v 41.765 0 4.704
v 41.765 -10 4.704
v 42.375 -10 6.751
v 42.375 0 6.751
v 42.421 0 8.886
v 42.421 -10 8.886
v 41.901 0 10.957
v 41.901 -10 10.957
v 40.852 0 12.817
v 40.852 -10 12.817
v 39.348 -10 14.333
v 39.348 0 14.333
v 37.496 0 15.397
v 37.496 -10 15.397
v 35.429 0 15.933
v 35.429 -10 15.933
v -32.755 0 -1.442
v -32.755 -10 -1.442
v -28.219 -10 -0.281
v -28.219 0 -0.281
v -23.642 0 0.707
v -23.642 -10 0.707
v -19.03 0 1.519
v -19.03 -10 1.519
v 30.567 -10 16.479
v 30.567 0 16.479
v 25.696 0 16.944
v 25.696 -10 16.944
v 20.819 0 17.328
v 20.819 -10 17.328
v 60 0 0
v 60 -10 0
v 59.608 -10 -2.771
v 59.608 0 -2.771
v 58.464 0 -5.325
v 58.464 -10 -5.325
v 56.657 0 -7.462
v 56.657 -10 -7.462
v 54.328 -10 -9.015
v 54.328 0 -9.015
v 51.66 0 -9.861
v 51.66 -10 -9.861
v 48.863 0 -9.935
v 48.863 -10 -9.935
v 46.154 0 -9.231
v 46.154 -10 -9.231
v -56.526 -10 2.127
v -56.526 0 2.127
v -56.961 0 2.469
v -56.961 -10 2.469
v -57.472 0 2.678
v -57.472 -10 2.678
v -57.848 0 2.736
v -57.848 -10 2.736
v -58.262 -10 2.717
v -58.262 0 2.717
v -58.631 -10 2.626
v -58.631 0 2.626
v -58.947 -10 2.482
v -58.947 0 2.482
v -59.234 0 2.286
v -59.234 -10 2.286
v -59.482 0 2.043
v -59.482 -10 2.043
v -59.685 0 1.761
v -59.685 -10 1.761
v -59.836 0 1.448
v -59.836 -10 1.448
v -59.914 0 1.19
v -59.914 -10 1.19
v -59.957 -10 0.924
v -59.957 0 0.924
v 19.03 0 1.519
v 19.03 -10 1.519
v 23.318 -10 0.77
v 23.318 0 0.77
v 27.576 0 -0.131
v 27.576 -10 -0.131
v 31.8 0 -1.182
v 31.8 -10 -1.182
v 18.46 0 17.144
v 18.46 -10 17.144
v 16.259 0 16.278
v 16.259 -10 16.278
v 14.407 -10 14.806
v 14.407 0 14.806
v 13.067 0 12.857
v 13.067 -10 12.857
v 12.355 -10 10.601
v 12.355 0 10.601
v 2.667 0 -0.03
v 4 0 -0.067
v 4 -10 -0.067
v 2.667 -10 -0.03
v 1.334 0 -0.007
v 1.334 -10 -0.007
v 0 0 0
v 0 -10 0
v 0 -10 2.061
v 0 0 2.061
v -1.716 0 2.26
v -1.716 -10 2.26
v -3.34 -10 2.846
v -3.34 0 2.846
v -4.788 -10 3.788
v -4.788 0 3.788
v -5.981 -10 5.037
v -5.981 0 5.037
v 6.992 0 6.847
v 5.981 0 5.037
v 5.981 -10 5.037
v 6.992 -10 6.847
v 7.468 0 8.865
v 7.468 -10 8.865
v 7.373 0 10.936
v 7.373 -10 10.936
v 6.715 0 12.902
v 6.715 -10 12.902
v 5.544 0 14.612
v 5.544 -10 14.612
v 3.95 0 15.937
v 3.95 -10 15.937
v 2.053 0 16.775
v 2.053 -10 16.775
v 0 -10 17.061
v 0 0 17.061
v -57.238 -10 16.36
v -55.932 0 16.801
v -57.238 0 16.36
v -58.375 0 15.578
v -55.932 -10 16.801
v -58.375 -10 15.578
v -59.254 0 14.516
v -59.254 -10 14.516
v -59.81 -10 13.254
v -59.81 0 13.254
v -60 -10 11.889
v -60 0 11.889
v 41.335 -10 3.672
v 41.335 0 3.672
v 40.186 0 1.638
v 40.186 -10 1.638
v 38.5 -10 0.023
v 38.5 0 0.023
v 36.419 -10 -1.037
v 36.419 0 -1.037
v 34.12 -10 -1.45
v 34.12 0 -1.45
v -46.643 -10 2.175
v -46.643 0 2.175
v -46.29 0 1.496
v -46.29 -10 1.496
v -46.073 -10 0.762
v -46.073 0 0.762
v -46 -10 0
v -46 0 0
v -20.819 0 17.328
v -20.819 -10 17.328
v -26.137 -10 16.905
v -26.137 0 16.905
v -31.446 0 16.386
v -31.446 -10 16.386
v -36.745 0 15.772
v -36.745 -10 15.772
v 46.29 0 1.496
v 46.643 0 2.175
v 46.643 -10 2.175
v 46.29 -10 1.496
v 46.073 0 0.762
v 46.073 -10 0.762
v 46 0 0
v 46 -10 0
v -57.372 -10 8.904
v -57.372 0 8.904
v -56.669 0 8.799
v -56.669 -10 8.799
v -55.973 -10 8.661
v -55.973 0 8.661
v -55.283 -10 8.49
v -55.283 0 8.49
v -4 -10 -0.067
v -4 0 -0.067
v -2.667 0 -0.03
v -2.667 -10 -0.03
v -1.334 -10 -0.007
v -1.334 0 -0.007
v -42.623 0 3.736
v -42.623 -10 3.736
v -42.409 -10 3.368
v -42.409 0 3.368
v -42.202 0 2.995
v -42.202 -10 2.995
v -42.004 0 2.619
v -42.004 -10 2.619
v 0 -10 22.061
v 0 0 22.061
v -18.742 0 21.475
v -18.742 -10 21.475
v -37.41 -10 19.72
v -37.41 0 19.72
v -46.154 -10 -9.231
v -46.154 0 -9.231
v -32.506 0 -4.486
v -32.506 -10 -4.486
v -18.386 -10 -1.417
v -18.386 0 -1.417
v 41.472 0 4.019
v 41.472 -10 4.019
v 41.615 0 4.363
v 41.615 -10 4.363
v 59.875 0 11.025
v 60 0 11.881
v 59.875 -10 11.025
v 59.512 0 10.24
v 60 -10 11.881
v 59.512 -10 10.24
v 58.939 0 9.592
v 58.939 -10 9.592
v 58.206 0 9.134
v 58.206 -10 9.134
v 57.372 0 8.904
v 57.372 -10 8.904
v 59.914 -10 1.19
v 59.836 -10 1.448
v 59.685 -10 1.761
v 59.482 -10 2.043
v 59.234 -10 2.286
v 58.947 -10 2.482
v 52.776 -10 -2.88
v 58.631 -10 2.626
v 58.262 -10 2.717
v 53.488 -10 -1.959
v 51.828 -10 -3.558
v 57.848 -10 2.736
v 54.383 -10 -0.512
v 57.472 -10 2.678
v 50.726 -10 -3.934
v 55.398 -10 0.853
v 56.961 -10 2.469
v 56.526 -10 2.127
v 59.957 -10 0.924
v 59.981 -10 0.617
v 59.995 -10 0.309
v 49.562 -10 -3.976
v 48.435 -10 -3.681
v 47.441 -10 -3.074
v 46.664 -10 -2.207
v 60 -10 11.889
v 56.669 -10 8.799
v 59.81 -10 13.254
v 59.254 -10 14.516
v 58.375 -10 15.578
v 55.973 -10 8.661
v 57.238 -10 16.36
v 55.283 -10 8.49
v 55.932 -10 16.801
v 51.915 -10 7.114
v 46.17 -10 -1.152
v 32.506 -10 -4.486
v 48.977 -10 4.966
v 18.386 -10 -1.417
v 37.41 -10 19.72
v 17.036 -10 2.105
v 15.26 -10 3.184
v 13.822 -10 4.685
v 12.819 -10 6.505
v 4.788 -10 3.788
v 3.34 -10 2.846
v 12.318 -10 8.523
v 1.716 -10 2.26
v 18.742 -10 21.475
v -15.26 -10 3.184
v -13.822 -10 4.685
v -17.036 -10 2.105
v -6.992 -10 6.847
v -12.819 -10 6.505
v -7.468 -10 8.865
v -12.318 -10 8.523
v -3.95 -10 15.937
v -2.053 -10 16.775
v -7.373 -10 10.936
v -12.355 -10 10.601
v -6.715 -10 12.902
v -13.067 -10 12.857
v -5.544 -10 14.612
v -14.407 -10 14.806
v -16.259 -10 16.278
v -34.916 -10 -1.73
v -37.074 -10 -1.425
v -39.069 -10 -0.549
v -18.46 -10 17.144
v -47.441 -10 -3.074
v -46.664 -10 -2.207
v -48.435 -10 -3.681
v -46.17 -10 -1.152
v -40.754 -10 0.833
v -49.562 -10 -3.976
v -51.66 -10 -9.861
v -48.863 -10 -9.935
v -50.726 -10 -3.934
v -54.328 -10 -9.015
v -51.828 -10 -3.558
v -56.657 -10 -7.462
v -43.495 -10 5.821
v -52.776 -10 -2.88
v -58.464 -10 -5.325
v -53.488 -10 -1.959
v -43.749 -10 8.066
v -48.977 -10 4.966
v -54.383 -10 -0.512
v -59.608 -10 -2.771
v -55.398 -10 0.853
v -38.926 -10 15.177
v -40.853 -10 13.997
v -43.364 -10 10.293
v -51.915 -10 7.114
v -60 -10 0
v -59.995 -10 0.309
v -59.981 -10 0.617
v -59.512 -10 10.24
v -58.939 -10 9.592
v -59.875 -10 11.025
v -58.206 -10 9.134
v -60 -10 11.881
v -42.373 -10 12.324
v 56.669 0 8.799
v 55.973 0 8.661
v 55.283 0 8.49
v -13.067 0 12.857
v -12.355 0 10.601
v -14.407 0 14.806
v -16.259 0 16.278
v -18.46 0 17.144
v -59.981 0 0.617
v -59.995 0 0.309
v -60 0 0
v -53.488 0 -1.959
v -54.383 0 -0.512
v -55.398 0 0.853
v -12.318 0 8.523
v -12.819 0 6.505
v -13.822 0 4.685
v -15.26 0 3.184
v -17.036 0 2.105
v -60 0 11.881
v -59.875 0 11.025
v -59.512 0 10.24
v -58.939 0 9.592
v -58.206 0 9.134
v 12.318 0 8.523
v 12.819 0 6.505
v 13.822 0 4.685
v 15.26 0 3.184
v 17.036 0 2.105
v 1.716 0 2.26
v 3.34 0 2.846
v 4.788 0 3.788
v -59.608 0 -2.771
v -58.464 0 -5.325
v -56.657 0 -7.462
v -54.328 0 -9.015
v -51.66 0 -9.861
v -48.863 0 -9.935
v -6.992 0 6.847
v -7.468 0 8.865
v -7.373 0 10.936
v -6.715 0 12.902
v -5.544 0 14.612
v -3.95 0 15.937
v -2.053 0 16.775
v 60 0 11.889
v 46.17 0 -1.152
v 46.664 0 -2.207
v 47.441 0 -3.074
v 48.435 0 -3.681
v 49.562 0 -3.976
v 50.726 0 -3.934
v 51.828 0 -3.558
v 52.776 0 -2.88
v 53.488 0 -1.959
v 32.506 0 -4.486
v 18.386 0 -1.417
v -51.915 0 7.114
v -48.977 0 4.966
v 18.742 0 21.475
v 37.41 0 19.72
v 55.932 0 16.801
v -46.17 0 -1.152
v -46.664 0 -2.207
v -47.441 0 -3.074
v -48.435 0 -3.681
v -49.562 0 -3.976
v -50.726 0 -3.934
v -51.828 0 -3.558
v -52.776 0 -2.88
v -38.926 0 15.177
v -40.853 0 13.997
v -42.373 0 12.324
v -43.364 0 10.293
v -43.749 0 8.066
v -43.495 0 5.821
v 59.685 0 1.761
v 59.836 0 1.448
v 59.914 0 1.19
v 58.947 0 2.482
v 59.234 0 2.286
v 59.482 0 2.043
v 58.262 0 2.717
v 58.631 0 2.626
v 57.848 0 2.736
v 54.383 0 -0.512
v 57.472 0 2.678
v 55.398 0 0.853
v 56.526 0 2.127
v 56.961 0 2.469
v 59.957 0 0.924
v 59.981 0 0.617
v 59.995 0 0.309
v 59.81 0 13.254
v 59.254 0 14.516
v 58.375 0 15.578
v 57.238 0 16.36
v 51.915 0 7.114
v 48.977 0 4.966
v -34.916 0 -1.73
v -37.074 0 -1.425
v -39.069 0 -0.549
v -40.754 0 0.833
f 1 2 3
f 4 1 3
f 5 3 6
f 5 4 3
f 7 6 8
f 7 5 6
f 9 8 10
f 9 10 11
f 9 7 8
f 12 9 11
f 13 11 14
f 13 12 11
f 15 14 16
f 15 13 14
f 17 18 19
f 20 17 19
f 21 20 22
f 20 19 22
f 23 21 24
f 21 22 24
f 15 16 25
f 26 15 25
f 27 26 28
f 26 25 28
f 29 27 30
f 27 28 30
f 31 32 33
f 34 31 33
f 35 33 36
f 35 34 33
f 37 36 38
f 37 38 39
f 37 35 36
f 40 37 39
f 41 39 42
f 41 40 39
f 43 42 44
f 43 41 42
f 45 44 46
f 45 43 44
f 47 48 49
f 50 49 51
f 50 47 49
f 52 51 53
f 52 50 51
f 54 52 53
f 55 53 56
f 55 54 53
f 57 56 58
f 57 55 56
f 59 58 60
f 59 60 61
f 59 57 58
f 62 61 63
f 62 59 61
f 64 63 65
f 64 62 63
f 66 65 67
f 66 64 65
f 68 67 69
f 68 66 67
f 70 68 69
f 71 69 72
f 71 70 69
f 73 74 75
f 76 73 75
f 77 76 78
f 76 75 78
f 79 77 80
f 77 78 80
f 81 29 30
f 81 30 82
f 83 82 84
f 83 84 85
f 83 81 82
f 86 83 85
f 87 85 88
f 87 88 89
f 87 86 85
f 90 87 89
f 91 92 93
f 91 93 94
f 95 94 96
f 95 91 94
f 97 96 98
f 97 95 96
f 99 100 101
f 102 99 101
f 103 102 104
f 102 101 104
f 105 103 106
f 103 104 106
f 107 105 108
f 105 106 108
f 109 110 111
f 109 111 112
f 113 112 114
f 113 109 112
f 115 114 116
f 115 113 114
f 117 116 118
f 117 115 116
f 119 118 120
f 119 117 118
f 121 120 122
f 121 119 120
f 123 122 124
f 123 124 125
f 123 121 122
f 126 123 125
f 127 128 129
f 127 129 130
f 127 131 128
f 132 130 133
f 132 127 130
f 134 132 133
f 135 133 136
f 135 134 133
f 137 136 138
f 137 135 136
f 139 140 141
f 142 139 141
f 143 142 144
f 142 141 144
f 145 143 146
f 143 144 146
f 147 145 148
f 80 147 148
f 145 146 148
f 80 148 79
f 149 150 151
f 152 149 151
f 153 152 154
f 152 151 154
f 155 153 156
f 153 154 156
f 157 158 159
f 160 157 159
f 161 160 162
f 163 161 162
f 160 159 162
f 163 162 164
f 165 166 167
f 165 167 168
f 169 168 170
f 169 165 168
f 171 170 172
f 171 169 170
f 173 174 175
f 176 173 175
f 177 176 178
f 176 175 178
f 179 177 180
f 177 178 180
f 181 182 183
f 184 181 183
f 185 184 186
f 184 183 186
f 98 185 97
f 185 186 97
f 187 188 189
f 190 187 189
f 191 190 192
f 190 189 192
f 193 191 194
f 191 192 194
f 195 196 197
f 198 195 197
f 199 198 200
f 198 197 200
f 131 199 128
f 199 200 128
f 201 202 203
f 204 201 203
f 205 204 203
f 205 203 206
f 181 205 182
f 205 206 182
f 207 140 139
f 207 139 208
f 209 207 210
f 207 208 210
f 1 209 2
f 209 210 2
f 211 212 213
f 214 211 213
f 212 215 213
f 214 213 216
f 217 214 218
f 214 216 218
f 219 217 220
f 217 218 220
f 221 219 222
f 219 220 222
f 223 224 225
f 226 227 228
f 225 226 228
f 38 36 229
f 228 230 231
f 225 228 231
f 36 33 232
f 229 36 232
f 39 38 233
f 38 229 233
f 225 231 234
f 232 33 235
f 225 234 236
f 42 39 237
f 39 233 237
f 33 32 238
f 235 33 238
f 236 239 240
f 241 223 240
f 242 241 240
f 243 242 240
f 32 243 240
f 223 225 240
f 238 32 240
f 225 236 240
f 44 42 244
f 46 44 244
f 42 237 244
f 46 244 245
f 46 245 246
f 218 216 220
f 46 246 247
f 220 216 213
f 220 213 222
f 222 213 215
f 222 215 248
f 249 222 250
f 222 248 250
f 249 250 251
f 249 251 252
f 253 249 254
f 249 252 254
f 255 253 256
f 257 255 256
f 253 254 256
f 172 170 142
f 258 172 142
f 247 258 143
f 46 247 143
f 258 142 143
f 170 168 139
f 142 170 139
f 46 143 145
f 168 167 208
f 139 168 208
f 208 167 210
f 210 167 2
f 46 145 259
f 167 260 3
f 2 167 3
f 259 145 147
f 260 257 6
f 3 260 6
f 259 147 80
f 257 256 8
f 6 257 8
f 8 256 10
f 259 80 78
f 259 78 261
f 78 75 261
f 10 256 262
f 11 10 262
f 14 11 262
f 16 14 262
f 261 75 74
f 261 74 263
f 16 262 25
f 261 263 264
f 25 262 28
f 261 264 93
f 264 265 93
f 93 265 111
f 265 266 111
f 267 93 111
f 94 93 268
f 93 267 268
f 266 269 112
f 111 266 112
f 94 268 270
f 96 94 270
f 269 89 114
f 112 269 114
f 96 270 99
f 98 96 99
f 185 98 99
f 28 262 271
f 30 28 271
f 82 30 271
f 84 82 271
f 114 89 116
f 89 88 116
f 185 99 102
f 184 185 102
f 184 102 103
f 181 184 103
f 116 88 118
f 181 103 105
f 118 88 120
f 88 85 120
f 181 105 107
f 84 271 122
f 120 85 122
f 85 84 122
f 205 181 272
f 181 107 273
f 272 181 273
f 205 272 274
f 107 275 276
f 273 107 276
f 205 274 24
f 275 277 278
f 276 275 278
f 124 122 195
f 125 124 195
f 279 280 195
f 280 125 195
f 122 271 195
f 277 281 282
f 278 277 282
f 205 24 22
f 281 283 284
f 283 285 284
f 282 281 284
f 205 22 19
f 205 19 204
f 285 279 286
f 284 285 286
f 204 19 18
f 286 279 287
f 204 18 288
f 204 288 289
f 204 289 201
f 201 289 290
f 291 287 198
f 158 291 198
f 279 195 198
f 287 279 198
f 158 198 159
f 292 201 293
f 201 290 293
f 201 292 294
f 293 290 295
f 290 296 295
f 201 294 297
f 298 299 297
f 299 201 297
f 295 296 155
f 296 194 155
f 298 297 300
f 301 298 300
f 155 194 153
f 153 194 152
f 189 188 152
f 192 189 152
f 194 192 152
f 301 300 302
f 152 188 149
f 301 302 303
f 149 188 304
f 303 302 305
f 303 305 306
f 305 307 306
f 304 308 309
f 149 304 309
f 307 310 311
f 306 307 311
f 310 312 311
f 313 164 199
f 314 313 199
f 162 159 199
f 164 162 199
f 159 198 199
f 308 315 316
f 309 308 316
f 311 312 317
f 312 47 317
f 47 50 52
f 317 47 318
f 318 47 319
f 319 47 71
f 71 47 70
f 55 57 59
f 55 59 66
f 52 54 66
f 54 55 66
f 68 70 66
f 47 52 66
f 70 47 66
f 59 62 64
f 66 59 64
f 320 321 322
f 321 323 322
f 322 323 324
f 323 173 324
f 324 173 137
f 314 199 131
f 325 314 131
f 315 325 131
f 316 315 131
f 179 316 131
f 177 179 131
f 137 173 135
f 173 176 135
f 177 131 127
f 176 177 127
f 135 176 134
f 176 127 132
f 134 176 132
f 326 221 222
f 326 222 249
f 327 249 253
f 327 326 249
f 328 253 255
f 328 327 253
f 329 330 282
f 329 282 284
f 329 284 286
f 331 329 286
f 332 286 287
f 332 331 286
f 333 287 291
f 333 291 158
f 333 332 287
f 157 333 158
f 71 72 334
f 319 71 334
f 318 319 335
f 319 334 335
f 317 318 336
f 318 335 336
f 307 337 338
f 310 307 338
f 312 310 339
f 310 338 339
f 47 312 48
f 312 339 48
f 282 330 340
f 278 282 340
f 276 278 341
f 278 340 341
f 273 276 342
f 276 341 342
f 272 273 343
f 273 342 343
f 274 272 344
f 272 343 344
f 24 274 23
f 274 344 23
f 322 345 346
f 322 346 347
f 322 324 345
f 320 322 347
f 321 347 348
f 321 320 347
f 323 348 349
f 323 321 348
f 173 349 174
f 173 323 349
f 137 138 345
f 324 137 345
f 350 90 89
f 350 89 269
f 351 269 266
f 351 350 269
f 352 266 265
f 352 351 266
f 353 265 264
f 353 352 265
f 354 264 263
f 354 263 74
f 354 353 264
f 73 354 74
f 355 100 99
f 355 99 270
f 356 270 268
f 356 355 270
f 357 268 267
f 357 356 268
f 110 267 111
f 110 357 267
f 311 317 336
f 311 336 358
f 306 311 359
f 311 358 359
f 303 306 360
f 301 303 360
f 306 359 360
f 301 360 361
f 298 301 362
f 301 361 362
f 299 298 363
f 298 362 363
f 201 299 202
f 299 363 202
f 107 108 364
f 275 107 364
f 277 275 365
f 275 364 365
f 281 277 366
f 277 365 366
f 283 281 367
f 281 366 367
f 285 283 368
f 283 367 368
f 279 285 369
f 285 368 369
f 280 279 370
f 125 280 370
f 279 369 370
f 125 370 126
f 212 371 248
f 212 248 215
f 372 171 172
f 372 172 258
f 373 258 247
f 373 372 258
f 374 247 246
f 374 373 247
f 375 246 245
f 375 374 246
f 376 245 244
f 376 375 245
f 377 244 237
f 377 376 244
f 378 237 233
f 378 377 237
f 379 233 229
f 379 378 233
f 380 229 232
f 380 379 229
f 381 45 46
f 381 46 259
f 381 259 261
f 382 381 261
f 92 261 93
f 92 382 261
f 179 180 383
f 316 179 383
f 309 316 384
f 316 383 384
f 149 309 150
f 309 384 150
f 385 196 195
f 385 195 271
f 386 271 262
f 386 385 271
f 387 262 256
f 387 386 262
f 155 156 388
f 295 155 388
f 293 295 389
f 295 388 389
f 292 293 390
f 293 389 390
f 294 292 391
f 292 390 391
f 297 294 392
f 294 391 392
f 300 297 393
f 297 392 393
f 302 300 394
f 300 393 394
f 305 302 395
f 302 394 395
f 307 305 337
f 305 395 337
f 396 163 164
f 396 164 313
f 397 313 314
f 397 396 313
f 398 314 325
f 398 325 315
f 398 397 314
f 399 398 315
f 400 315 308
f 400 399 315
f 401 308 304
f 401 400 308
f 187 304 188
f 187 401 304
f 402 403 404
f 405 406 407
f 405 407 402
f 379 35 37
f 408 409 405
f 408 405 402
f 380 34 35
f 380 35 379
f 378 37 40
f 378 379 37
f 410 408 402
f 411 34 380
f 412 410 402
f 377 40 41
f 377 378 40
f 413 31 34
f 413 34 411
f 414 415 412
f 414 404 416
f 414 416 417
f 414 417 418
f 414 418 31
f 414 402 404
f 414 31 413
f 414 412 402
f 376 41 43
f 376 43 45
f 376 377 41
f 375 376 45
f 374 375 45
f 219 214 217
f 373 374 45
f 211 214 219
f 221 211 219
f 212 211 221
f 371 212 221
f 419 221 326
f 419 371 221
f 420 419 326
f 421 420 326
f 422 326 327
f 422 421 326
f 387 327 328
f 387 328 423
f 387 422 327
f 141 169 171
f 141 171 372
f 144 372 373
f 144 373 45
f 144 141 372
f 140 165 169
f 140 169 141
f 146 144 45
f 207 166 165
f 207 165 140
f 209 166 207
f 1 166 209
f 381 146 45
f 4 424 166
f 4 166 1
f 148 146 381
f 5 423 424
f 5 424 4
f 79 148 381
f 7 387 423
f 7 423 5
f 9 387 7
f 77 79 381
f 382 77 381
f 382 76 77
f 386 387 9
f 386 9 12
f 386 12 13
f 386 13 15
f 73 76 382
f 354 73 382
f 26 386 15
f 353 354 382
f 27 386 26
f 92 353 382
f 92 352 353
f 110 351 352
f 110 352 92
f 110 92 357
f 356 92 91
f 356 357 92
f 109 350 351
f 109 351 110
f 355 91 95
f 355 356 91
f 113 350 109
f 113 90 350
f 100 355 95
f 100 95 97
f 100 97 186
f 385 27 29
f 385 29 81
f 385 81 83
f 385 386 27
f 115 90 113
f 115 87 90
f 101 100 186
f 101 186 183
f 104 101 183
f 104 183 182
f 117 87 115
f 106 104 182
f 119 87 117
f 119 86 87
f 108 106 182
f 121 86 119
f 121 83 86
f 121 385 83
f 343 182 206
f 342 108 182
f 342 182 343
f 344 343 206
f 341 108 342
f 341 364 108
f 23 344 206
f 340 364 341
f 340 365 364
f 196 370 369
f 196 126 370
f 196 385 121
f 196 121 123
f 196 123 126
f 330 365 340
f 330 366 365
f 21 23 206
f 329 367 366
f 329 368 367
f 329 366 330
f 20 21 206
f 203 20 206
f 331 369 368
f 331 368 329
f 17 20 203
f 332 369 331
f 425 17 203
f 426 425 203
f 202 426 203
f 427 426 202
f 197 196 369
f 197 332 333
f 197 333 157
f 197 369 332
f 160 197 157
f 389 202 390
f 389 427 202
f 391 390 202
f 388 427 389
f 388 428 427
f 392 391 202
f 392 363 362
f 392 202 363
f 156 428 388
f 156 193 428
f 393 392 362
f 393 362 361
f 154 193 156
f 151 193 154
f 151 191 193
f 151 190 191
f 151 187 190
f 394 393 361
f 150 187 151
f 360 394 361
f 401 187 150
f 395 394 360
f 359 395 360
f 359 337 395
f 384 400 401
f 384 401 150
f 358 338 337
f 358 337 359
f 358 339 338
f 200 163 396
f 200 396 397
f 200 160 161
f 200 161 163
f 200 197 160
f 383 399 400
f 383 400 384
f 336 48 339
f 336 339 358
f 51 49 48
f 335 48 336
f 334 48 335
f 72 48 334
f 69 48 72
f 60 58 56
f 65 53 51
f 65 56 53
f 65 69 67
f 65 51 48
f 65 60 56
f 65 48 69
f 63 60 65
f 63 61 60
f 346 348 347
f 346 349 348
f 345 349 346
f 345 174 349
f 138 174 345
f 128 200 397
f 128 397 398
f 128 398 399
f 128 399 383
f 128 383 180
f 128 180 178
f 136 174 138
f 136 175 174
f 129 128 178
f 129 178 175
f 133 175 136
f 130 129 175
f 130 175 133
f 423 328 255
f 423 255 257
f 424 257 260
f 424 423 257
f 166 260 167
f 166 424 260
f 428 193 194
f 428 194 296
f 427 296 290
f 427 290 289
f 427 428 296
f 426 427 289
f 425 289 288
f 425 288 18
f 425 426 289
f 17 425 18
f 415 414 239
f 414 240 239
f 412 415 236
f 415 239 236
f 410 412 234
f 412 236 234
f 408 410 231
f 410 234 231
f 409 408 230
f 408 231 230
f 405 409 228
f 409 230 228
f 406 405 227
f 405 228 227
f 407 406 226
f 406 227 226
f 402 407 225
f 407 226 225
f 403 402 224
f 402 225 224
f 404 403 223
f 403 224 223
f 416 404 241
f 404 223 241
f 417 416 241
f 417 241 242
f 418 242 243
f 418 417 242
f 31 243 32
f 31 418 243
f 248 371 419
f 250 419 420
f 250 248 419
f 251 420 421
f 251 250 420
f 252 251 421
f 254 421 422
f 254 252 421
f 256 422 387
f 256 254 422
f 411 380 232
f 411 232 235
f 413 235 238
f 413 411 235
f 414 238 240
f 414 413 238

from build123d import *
from build123d import SkipClean  # not in build123d's __all__

# Parameters (mm, degrees)
F1_DEPTH    = 10
F3_R        = 5
F4_R        = 3
F5_R        = 2
F7_DEPTH    = 10.0010001
F8_T1_DEPTH = 10


# Not quite as in the source:
# - a fillet or chamfer that OpenCascade refuses, or shapes differently, is made with other operations: its cross-section is extruded or revolved along the edge and cut away or added


with BuildPart() as f1:
    # F0 (on Front) → F1 (new body)
    with BuildSketch(Plane.XZ):
        with BuildLine():
            ThreePointArc((-60, 9), (-57.6213157363, 8.9328971517), (-55.2831757887, 8.4904683961))
            ThreePointArc((-55.2831757887, 8.4904683961), (-45.1436514688, 8.7416176388), (-40, 0))
            ThreePointArc((-40, 0), (-41.6794970566, -5.5470019623), (-46.1538461538, -9.2307692308))
            ThreePointArc((-46.1538461538, -9.2307692308), (-25.4921003461, -2.7389543798), (-4, -0.0666851955))
            ThreePointArc((-4, -0.0666851955), (-4.6347028183, 2.6231856146), (-5.9814434357, 5.03659448))
            ThreePointArc((-5.9814434357, 5.03659448), (-6.715086481, 12.9015322824), (0, 17.061230866))
            Line((0, 17.061230866), (0, 22.061230866))
            ThreePointArc((0, 22.061230866), (-30.1526886016, 20.5420767676), (-60, 16))
            Line((-60, 16), (-60, 9))
        make_face()
        with BuildLine():
            ThreePointArc((-46.6427971379, 2.1746698468), (-46.1640639051, 1.1338404984), (-46, 0))
            ThreePointArc((-46, 0), (-48.9877288652, -3.8697941999), (-53.4876535749, -1.958640483))
            ThreePointArc((-53.4876535749, -1.958640483), (-55.921777017, 1.4722128283), (-59.0196729824, 4.3180434563))
            ThreePointArc((-59.0196729824, 4.3180434563), (-59.7518390528, 2.21396366), (-60, 0))
            ThreePointArc((-60, 0), (-55.5470019623, -8.3205029434), (-46.1538461538, -9.2307692308))
            ThreePointArc((-46.1538461538, -9.2307692308), (-41.6794970566, -5.5470019623), (-40, 0))
            ThreePointArc((-40, 0), (-45.1436514688, 8.7416176388), (-55.2831757887, 8.4904683961))
            ThreePointArc((-55.2831757887, 8.4904683961), (-50.3805281419, 6.1294058803), (-46.6427971379, 2.1746698468))
        make_face()
        with BuildLine():
            ThreePointArc((-5.9814434357, 5.03659448), (-4.6347028183, 2.6231856146), (-4, -0.0666851955))
            ThreePointArc((-4, -0.0666851955), (-2.0002779129, -0.0166724571), (0, 0))
            Line((0, 0), (0, 2.061230866))
            ThreePointArc((0, 2.061230866), (-3.3403014164, 2.846144385), (-5.9814434357, 5.03659448))
        make_face()
    extrude(amount=F1_DEPTH)

    # F2: F1 across plane


with BuildPart() as f1_1:
    add(f1.part, clean=False)
    with SkipClean():  # cleaning this boolean's faces spoils the solid; the shape is the same uncleaned
        add(f1.part.mirror(Plane.YZ), clean=False)

    # F3
    f3_edges = [f1_1.edges().sort_by_distance(p)[0] for p in [
        (-60, -5, 16),
        (60, -5, 16),
    ]]
    fillet(f3_edges, radius=F3_R)

    # F4
    f4_edges = [f1_1.edges().sort_by_distance(p)[0] for p in [
        (-60, -5, 9),
        (60, -5, 9),
    ]]
    fillet(f4_edges, radius=F4_R)

    # F5
    f5_edges = [f1_1.edges().sort_by_distance(p)[0] for p in [
        (-59.019673, -5, 4.318043),
        (59.019673, -5, 4.318043),
    ]]
    fillet(f5_edges, radius=F5_R)

    # F6 (on face) → F7 (cut, through all)
    with BuildSketch(Plane.XZ.offset(10)):
        with BuildLine():
            ThreePointArc((-7.8234196702, 2.7509433962), (-12.1811976175, 9.6949287705), (-11.2993718648, 17.8454836508))
            ThreePointArc((-11.2993718648, 17.8454836508), (-33.2415394106, 16.1887543276), (-55, 12.9065505808))
            ThreePointArc((-55, 12.9065505808), (-44.9636385736, 6.903343626), (-40, -3.685770432))
            ThreePointArc((-40, -3.685770432), (-24.1273224471, 0.6104154355), (-7.8234196702, 2.7509433962))
        make_face()
        with BuildLine():
            ThreePointArc((40, -3.685770432), (42.6359894717, 6.412330531), (50, 13.8076961402))
            ThreePointArc((50, 13.8076961402), (30.7161061945, 16.4632023612), (11.2993718648, 17.8454836508))
            ThreePointArc((11.2993718648, 17.8454836508), (12.1961499726, 15.2393294517), (12.5, 12.5))
            ThreePointArc((12.5, 12.5), (11.2703759005, 7.0936493768), (7.8234196702, 2.7509433962))
            ThreePointArc((7.8234196702, 2.7509433962), (24.1273224471, 0.6104154355), (40, -3.685770432))
        make_face()
    extrude(amount=-F7_DEPTH, mode=Mode.SUBTRACT)

    # F8: fillet of radius 8 on 8 edges, made by hand

    # F8_s2 → F8_t1 (join)
    with BuildSketch(Plane.XZ):
        with BuildLine():
            ThreePointArc((-36.7451179027, 15.7716261712), (-42.9406323526, 11.3440144515), (-42.6227863201, 3.7356559729))
            ThreePointArc((-42.6227863201, 3.7356559729), (-47.8930149535, 9.5605639606), (-55, 12.9065505808))
            ThreePointArc((-55, 12.9065505808), (-45.8949216066, 14.4815724477), (-36.7451179027, 15.7716261712))
        make_face()
        with BuildLine():
            ThreePointArc((-42.0039790926, 2.6185161763), (-38.1014001727, -1.0557269801), (-32.7552534978, -1.4416035521))
            ThreePointArc((-32.7552534978, -1.4416035521), (-36.3949282061, -2.5078334489), (-40, -3.685770432))
            ThreePointArc((-40, -3.685770432), (-40.7395345489, -0.4501990795), (-42.0039790926, 2.6185161763))
        make_face()
        with BuildLine():
            ThreePointArc((-12.3583566886, 10.623561896), (-13.8147498473, 4.6940719377), (-19.0299825284, 1.5189687455))
            ThreePointArc((-19.0299825284, 1.5189687455), (-13.4408237395, 2.2634215831), (-7.8234196702, 2.7509433962))
            ThreePointArc((-7.8234196702, 2.7509433962), (-10.83146134, 6.2606534605), (-12.3583566886, 10.623561896))
        make_face()
        with BuildLine():
            ThreePointArc((-12.3513599638, 10.578046035), (-15.2694424, 15.6035487131), (-20.8189034057, 17.3281834039))
            ThreePointArc((-20.8189034057, 17.3281834039), (-16.0612204229, 17.6251616805), (-11.2993718648, 17.8454836508))
            ThreePointArc((-11.2993718648, 17.8454836508), (-12.3710626618, 14.2907564373), (-12.3513599638, 10.578046035))
        make_face()
        with BuildLine():
            ThreePointArc((20.8189034057, 17.3281834039), (15.2694424, 15.6035487131), (12.3513599638, 10.578046035))
            ThreePointArc((12.3513599638, 10.578046035), (12.3710626618, 14.2907564373), (11.2993718648, 17.8454836508))
            ThreePointArc((11.2993718648, 17.8454836508), (16.0612204229, 17.6251616805), (20.8189034057, 17.3281834039))
        make_face()
        with BuildLine():
            ThreePointArc((12.3583566886, 10.623561896), (13.8147498473, 4.6940719377), (19.0299825284, 1.5189687455))
            ThreePointArc((19.0299825284, 1.5189687455), (13.4408237395, 2.2634215831), (7.8234196702, 2.7509433962))
            ThreePointArc((7.8234196702, 2.7509433962), (10.83146134, 6.2606534605), (12.3583566886, 10.623561896))
        make_face()
        with BuildLine():
            ThreePointArc((41.7652662923, 4.7039127832), (41.4390880083, 11.9220711187), (35.429216879, 15.9332618444))
            ThreePointArc((35.429216879, 15.9332618444), (42.7278279524, 14.9610989412), (50, 13.8076961402))
            ThreePointArc((50, 13.8076961402), (45.1669008636, 9.9032127448), (41.7652662923, 4.7039127832))
        make_face()
        with BuildLine():
            ThreePointArc((41.3345230553, 3.6720037672), (37.4981716447, -0.5831636355), (31.800316666, -1.1819043245))
            ThreePointArc((31.800316666, -1.1819043245), (35.9219808015, -2.3623729613), (40, -3.685770432))
            ThreePointArc((40, -3.685770432), (40.3203276581, 0.056042117), (41.3345230553, 3.6720037672))
        make_face()
    extrude(amount=F8_T1_DEPTH)


solid = f1_1.part
